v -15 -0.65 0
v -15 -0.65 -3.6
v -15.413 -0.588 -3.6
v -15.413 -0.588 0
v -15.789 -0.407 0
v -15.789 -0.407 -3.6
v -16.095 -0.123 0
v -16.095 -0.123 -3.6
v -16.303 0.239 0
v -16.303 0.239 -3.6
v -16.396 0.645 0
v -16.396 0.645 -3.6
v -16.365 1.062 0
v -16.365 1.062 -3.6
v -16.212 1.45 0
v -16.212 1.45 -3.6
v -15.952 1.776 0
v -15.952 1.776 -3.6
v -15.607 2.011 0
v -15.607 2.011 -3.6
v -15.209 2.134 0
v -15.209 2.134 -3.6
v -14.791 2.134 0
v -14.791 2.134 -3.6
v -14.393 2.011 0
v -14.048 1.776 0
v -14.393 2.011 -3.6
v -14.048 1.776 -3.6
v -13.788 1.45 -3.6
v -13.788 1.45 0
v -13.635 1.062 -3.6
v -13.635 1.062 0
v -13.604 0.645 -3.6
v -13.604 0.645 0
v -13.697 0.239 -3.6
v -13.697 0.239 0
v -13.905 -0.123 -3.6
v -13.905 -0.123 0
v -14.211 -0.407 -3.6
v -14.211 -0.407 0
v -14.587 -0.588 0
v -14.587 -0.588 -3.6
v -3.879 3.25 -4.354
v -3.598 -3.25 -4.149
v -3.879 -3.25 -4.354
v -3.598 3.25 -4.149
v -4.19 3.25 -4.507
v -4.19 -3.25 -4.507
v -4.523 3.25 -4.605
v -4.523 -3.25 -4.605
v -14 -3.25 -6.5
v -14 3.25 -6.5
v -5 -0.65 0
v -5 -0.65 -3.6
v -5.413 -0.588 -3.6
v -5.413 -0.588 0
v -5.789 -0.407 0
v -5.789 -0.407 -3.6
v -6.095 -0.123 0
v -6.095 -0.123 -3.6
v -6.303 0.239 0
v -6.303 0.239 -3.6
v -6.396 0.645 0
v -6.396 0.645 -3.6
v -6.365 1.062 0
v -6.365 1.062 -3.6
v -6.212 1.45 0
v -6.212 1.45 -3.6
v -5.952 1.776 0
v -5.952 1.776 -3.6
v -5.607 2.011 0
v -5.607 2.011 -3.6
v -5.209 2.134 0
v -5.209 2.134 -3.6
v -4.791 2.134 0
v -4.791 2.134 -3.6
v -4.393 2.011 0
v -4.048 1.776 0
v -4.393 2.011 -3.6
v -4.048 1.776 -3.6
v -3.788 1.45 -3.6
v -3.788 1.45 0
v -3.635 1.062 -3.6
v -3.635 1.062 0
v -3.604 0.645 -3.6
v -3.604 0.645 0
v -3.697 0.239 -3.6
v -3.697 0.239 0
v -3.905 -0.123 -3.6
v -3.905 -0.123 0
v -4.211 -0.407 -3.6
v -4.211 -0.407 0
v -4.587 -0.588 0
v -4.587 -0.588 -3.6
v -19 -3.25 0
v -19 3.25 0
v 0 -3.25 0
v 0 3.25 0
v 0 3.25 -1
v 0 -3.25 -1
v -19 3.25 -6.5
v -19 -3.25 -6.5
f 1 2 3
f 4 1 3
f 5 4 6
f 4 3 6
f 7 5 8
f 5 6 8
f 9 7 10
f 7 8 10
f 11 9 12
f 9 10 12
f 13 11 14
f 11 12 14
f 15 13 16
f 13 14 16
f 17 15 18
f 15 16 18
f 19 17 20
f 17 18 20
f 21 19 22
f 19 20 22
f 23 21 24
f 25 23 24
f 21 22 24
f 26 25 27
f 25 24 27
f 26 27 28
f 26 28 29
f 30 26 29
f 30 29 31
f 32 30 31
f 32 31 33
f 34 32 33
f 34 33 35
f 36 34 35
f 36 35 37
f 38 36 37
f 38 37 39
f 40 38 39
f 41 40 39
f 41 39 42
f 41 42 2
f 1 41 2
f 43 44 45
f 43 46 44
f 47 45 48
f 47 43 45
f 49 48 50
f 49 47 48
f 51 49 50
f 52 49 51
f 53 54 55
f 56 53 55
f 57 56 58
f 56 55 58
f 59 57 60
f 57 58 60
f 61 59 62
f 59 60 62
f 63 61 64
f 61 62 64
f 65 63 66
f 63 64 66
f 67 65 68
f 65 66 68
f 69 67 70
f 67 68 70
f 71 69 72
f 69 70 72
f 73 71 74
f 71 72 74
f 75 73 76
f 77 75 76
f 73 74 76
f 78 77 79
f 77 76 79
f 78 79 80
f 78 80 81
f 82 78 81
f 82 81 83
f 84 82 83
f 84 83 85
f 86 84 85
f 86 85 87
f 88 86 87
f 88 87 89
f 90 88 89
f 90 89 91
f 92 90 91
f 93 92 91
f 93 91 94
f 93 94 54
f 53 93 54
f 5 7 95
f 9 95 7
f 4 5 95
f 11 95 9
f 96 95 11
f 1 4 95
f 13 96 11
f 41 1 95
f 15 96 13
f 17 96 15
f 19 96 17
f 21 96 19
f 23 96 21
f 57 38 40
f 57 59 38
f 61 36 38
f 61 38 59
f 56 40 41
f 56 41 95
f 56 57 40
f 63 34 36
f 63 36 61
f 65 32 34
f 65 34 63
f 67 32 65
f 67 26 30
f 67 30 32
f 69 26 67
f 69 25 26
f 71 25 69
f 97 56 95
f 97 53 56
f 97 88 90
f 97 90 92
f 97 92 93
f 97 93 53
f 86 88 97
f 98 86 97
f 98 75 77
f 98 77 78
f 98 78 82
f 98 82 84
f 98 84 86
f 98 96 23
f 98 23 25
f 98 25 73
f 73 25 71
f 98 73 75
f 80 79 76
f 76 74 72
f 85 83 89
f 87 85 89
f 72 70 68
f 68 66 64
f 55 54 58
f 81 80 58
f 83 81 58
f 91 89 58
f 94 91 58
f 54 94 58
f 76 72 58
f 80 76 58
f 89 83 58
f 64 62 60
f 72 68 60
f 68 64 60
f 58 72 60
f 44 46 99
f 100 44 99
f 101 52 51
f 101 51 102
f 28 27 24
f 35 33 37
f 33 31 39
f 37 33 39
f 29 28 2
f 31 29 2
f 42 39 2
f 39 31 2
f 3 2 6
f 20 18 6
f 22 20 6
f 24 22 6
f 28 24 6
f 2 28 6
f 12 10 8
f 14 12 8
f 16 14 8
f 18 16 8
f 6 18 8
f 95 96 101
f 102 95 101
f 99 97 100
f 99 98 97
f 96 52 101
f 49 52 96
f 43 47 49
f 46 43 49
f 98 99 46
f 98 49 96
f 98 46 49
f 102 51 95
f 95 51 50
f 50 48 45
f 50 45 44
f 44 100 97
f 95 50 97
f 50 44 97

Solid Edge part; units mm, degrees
sketch "Sketch1" plane through (0, 0, 0) normal (0, -1, 0) x (1, 0, 0)
  line L0 (-19, 0) -> (0, 0)
  line L1 (0, 0) -> (0, -1)
  line L2 (-4, -4.5) -> (0, -1)
  line L3 (-4, -4.5) -> (-14, -6.5)
  line L4 (-14, -6.5) -> (-19, -6.5)
  line L5 (-19, 0) -> (-19, -6.5)
extrude "Protrusion1" add sketch "Sketch1" along normal mid plane 6.5
fillet "Verrundung_1" radius 2 1 edges at (-4, 0, -4.5)
hole "Bohrung_1" at (-5, 0.75, 0) direction (0, 0, -1) diameter 2.8 depth 3.6
hole "Hole1" at (-15, 0.75, 0) direction (0, 0, -1) diameter 2.8 depth 3.6
